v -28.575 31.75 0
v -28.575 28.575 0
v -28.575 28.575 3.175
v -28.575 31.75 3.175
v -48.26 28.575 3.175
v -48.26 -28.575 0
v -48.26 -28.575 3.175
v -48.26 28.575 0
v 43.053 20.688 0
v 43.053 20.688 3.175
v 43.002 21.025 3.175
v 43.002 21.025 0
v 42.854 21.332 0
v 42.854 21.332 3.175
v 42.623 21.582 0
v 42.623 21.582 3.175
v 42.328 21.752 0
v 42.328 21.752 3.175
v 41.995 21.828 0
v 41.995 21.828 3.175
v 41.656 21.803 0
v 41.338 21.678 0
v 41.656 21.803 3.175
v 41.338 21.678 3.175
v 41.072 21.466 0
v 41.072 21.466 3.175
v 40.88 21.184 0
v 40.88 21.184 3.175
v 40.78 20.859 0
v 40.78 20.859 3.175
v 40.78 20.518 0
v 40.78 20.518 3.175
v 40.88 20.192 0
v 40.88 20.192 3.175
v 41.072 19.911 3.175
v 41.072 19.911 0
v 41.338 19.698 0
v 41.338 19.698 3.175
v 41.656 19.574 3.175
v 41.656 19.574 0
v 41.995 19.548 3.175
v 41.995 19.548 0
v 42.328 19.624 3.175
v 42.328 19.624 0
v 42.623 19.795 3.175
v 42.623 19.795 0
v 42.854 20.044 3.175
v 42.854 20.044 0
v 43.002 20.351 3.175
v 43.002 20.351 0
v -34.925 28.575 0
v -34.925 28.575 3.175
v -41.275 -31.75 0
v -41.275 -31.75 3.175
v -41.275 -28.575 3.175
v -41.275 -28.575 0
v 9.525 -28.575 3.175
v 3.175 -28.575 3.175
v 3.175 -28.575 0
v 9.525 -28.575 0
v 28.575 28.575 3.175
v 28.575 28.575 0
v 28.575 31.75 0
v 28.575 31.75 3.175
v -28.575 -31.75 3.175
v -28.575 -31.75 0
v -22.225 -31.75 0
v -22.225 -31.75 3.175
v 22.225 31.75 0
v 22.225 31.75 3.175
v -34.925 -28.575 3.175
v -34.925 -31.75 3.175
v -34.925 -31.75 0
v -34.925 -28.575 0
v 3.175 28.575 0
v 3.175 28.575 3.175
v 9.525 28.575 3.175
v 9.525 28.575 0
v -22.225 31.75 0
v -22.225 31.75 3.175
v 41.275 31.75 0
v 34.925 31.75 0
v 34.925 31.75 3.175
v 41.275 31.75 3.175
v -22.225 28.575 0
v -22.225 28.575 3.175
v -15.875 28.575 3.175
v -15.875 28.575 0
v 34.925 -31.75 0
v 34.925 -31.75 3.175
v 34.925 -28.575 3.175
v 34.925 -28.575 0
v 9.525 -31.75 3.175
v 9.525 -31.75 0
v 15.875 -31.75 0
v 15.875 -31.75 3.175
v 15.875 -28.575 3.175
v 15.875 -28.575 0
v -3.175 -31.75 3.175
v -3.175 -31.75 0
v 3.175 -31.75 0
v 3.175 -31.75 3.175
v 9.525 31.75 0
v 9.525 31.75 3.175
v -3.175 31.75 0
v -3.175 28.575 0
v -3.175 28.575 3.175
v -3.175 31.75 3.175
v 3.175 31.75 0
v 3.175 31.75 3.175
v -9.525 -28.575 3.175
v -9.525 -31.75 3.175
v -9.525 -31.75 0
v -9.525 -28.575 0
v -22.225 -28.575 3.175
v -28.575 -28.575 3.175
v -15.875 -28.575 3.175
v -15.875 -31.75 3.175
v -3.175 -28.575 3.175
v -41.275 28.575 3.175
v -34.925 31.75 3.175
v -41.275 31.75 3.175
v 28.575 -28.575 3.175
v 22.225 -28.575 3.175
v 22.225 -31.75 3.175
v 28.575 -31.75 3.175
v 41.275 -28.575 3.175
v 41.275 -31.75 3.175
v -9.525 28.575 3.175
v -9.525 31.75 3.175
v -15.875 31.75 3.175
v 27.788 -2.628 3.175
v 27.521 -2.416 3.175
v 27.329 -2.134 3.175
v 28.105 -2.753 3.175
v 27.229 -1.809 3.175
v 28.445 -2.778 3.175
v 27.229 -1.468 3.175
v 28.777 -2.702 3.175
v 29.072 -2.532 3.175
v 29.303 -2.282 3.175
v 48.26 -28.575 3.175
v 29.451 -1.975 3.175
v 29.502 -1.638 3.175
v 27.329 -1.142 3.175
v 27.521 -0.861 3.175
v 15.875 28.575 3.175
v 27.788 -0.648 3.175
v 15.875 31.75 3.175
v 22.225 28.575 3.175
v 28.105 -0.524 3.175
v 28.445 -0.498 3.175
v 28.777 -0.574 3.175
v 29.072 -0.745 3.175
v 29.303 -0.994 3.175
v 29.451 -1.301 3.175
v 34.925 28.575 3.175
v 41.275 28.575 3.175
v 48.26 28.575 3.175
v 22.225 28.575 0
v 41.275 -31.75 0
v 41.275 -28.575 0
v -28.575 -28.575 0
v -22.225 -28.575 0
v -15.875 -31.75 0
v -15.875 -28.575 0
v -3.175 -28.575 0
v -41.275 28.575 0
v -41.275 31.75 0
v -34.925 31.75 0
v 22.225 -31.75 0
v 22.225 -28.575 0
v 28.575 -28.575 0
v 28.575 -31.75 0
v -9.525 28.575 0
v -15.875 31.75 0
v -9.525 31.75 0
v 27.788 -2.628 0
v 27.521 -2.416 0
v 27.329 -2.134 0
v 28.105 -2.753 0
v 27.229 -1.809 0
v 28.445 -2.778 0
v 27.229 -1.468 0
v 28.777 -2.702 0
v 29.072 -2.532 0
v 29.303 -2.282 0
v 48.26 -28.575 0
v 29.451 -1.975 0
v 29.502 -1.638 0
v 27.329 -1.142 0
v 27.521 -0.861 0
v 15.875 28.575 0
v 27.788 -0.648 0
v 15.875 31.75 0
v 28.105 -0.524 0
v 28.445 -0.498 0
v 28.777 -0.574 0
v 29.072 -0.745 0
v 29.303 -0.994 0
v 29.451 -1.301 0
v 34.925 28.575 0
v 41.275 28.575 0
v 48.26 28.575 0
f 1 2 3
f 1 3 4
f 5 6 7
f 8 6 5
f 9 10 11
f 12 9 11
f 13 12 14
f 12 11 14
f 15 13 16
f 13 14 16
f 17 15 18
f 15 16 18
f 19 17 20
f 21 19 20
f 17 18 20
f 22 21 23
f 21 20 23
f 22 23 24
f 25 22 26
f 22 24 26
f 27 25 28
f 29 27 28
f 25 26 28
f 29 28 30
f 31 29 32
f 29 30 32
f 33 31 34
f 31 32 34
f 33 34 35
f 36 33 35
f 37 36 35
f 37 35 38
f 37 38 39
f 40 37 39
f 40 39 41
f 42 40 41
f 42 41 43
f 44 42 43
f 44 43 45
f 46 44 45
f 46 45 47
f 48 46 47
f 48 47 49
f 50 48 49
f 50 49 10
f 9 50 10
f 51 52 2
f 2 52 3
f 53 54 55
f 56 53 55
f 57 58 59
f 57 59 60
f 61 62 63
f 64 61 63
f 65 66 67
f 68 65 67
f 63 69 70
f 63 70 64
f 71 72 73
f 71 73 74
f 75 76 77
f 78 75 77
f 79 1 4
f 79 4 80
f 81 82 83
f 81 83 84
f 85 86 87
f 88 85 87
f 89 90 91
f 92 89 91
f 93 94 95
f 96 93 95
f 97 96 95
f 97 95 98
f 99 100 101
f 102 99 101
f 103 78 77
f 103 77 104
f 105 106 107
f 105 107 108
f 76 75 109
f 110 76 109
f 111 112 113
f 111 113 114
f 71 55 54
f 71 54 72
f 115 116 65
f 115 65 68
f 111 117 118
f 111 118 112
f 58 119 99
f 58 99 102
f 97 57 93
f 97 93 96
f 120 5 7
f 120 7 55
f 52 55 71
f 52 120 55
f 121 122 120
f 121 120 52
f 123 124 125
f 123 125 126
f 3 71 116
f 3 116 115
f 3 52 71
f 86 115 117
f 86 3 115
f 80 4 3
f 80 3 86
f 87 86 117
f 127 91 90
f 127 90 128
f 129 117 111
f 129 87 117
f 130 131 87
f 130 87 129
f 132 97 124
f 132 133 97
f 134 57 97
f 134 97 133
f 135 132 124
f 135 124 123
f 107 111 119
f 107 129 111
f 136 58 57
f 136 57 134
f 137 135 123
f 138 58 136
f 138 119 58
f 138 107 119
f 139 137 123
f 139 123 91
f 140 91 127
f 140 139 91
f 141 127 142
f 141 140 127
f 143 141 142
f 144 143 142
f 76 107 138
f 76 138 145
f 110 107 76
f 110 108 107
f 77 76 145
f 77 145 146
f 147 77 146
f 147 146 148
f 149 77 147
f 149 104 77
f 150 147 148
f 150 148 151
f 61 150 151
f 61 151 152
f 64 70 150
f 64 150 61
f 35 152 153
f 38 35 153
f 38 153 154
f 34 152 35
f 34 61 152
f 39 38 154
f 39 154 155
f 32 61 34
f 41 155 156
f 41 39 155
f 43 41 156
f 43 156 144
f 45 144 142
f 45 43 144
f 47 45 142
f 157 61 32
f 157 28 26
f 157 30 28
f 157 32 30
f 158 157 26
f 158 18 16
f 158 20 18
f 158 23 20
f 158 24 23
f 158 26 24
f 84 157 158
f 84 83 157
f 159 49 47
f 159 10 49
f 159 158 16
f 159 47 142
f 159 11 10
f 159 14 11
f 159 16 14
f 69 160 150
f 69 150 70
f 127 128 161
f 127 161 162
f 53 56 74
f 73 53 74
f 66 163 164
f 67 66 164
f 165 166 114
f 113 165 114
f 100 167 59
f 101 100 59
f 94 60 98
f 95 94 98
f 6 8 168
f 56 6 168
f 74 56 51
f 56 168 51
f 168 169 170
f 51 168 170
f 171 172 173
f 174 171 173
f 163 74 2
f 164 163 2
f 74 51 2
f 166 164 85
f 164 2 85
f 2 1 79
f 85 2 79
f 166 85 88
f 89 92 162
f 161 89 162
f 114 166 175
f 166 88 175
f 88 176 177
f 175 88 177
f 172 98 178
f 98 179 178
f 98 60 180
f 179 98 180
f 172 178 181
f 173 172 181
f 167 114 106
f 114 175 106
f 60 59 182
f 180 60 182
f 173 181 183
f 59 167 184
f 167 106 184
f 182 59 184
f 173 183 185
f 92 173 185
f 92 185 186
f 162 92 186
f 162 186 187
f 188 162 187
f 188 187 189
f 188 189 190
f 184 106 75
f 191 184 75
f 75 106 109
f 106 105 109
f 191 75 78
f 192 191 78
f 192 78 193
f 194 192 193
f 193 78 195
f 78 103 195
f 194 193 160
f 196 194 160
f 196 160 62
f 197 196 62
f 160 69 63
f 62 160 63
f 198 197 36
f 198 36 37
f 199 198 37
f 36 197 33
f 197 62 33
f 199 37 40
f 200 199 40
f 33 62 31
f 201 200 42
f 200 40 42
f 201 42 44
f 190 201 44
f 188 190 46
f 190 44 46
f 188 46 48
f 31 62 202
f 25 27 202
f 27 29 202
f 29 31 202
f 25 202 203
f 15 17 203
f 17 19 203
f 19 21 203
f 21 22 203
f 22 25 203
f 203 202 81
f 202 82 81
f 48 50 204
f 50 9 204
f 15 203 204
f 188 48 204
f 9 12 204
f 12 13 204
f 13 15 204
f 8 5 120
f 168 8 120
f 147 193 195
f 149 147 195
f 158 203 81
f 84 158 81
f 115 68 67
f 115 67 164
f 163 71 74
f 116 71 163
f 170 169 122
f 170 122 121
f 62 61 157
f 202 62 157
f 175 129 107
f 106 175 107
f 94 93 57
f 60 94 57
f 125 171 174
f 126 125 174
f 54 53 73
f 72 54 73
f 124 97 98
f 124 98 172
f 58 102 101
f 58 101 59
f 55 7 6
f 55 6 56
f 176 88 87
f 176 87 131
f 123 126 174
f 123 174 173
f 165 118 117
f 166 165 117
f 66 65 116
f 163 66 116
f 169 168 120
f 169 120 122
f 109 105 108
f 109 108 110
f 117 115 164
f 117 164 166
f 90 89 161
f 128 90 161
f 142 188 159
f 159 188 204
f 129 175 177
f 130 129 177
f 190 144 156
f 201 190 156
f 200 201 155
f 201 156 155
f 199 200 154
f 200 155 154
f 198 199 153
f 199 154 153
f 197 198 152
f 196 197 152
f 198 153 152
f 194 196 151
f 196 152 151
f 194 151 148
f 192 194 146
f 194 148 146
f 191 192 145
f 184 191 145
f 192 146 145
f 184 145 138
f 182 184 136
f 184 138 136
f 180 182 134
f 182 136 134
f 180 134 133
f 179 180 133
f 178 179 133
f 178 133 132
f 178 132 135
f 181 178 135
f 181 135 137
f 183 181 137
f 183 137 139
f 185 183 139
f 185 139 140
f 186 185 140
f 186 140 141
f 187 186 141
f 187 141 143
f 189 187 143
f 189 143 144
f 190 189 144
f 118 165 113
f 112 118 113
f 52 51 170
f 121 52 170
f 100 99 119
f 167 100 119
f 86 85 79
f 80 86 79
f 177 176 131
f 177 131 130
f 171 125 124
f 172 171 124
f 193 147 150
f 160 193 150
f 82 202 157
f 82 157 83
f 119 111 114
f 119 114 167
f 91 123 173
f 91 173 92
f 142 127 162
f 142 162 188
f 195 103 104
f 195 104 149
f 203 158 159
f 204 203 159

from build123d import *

# Parameters (mm, degrees)
SKETCH1_W           = 96.52
SKETCH1_H           = 63.5
BOSS_EXTRUDE1_DEPTH = 3.175
SKETCH2_W           = 6.985
SKETCH2_H           = 3.175
SKETCH2_W_2         = 6.35
CUT_EXTRUDE1_DEPTH  = 4.175
SKETCH3_R           = 1.143
CUT_EXTRUDE2_DEPTH  = 4.175


with BuildPart() as part:
    # Sketch1 → Boss-Extrude1 (new body)
    with BuildSketch(Plane.XY):
        Rectangle(SKETCH1_W, SKETCH1_H)
    extrude(amount=BOSS_EXTRUDE1_DEPTH)

    # Sketch2 → Cut-Extrude1 (cut, through all)
    with BuildSketch(Plane.XY.offset(3.175)):
        with Locations((-44.7675, -30.1625)):
            Rectangle(SKETCH2_W, SKETCH2_H)
        with Locations((-31.75, -30.1625)):
            Rectangle(SKETCH2_W_2, SKETCH2_H)
        with Locations((-19.05, -30.1625)):
            Rectangle(SKETCH2_W_2, SKETCH2_H)
        with Locations((-6.35, -30.1625)):
            Rectangle(SKETCH2_W_2, SKETCH2_H)
        with Locations((6.35, -30.1625)):
            Rectangle(SKETCH2_W_2, SKETCH2_H)
        with Locations((19.05, -30.1625)):
            Rectangle(SKETCH2_W_2, SKETCH2_H)
        with Locations((31.75, -30.1625)):
            Rectangle(SKETCH2_W_2, SKETCH2_H)
        with Locations((44.7675, -30.1625)):
            Rectangle(SKETCH2_W, SKETCH2_H)
        with Locations((44.7675, 30.1625)):
            Rectangle(SKETCH2_W, SKETCH2_H)
        with Locations((31.75, 30.1625)):
            Rectangle(SKETCH2_W_2, SKETCH2_H)
        with Locations((19.05, 30.1625)):
            Rectangle(SKETCH2_W_2, SKETCH2_H)
        with Locations((6.35, 30.1625)):
            Rectangle(SKETCH2_W_2, SKETCH2_H)
        with Locations((-6.35, 30.1625)):
            Rectangle(SKETCH2_W_2, SKETCH2_H)
        with Locations((-19.05, 30.1625)):
            Rectangle(SKETCH2_W_2, SKETCH2_H)
        with Locations((-31.75, 30.1625)):
            Rectangle(SKETCH2_W_2, SKETCH2_H)
        with Locations((-44.7675, 30.1625)):
            Rectangle(SKETCH2_W, SKETCH2_H)
    extrude(amount=-CUT_EXTRUDE1_DEPTH, mode=Mode.SUBTRACT)

    # Sketch3 → Cut-Extrude2 (cut, through all)
    with BuildSketch(Plane.XY.offset(3.175)):
        with Locations((28.3591, -1.6383)):
            Circle(SKETCH3_R)
        with Locations((41.91, 20.6883)):
            Circle(SKETCH3_R)
    extrude(amount=-CUT_EXTRUDE2_DEPTH, mode=Mode.SUBTRACT)


solid = part.part
